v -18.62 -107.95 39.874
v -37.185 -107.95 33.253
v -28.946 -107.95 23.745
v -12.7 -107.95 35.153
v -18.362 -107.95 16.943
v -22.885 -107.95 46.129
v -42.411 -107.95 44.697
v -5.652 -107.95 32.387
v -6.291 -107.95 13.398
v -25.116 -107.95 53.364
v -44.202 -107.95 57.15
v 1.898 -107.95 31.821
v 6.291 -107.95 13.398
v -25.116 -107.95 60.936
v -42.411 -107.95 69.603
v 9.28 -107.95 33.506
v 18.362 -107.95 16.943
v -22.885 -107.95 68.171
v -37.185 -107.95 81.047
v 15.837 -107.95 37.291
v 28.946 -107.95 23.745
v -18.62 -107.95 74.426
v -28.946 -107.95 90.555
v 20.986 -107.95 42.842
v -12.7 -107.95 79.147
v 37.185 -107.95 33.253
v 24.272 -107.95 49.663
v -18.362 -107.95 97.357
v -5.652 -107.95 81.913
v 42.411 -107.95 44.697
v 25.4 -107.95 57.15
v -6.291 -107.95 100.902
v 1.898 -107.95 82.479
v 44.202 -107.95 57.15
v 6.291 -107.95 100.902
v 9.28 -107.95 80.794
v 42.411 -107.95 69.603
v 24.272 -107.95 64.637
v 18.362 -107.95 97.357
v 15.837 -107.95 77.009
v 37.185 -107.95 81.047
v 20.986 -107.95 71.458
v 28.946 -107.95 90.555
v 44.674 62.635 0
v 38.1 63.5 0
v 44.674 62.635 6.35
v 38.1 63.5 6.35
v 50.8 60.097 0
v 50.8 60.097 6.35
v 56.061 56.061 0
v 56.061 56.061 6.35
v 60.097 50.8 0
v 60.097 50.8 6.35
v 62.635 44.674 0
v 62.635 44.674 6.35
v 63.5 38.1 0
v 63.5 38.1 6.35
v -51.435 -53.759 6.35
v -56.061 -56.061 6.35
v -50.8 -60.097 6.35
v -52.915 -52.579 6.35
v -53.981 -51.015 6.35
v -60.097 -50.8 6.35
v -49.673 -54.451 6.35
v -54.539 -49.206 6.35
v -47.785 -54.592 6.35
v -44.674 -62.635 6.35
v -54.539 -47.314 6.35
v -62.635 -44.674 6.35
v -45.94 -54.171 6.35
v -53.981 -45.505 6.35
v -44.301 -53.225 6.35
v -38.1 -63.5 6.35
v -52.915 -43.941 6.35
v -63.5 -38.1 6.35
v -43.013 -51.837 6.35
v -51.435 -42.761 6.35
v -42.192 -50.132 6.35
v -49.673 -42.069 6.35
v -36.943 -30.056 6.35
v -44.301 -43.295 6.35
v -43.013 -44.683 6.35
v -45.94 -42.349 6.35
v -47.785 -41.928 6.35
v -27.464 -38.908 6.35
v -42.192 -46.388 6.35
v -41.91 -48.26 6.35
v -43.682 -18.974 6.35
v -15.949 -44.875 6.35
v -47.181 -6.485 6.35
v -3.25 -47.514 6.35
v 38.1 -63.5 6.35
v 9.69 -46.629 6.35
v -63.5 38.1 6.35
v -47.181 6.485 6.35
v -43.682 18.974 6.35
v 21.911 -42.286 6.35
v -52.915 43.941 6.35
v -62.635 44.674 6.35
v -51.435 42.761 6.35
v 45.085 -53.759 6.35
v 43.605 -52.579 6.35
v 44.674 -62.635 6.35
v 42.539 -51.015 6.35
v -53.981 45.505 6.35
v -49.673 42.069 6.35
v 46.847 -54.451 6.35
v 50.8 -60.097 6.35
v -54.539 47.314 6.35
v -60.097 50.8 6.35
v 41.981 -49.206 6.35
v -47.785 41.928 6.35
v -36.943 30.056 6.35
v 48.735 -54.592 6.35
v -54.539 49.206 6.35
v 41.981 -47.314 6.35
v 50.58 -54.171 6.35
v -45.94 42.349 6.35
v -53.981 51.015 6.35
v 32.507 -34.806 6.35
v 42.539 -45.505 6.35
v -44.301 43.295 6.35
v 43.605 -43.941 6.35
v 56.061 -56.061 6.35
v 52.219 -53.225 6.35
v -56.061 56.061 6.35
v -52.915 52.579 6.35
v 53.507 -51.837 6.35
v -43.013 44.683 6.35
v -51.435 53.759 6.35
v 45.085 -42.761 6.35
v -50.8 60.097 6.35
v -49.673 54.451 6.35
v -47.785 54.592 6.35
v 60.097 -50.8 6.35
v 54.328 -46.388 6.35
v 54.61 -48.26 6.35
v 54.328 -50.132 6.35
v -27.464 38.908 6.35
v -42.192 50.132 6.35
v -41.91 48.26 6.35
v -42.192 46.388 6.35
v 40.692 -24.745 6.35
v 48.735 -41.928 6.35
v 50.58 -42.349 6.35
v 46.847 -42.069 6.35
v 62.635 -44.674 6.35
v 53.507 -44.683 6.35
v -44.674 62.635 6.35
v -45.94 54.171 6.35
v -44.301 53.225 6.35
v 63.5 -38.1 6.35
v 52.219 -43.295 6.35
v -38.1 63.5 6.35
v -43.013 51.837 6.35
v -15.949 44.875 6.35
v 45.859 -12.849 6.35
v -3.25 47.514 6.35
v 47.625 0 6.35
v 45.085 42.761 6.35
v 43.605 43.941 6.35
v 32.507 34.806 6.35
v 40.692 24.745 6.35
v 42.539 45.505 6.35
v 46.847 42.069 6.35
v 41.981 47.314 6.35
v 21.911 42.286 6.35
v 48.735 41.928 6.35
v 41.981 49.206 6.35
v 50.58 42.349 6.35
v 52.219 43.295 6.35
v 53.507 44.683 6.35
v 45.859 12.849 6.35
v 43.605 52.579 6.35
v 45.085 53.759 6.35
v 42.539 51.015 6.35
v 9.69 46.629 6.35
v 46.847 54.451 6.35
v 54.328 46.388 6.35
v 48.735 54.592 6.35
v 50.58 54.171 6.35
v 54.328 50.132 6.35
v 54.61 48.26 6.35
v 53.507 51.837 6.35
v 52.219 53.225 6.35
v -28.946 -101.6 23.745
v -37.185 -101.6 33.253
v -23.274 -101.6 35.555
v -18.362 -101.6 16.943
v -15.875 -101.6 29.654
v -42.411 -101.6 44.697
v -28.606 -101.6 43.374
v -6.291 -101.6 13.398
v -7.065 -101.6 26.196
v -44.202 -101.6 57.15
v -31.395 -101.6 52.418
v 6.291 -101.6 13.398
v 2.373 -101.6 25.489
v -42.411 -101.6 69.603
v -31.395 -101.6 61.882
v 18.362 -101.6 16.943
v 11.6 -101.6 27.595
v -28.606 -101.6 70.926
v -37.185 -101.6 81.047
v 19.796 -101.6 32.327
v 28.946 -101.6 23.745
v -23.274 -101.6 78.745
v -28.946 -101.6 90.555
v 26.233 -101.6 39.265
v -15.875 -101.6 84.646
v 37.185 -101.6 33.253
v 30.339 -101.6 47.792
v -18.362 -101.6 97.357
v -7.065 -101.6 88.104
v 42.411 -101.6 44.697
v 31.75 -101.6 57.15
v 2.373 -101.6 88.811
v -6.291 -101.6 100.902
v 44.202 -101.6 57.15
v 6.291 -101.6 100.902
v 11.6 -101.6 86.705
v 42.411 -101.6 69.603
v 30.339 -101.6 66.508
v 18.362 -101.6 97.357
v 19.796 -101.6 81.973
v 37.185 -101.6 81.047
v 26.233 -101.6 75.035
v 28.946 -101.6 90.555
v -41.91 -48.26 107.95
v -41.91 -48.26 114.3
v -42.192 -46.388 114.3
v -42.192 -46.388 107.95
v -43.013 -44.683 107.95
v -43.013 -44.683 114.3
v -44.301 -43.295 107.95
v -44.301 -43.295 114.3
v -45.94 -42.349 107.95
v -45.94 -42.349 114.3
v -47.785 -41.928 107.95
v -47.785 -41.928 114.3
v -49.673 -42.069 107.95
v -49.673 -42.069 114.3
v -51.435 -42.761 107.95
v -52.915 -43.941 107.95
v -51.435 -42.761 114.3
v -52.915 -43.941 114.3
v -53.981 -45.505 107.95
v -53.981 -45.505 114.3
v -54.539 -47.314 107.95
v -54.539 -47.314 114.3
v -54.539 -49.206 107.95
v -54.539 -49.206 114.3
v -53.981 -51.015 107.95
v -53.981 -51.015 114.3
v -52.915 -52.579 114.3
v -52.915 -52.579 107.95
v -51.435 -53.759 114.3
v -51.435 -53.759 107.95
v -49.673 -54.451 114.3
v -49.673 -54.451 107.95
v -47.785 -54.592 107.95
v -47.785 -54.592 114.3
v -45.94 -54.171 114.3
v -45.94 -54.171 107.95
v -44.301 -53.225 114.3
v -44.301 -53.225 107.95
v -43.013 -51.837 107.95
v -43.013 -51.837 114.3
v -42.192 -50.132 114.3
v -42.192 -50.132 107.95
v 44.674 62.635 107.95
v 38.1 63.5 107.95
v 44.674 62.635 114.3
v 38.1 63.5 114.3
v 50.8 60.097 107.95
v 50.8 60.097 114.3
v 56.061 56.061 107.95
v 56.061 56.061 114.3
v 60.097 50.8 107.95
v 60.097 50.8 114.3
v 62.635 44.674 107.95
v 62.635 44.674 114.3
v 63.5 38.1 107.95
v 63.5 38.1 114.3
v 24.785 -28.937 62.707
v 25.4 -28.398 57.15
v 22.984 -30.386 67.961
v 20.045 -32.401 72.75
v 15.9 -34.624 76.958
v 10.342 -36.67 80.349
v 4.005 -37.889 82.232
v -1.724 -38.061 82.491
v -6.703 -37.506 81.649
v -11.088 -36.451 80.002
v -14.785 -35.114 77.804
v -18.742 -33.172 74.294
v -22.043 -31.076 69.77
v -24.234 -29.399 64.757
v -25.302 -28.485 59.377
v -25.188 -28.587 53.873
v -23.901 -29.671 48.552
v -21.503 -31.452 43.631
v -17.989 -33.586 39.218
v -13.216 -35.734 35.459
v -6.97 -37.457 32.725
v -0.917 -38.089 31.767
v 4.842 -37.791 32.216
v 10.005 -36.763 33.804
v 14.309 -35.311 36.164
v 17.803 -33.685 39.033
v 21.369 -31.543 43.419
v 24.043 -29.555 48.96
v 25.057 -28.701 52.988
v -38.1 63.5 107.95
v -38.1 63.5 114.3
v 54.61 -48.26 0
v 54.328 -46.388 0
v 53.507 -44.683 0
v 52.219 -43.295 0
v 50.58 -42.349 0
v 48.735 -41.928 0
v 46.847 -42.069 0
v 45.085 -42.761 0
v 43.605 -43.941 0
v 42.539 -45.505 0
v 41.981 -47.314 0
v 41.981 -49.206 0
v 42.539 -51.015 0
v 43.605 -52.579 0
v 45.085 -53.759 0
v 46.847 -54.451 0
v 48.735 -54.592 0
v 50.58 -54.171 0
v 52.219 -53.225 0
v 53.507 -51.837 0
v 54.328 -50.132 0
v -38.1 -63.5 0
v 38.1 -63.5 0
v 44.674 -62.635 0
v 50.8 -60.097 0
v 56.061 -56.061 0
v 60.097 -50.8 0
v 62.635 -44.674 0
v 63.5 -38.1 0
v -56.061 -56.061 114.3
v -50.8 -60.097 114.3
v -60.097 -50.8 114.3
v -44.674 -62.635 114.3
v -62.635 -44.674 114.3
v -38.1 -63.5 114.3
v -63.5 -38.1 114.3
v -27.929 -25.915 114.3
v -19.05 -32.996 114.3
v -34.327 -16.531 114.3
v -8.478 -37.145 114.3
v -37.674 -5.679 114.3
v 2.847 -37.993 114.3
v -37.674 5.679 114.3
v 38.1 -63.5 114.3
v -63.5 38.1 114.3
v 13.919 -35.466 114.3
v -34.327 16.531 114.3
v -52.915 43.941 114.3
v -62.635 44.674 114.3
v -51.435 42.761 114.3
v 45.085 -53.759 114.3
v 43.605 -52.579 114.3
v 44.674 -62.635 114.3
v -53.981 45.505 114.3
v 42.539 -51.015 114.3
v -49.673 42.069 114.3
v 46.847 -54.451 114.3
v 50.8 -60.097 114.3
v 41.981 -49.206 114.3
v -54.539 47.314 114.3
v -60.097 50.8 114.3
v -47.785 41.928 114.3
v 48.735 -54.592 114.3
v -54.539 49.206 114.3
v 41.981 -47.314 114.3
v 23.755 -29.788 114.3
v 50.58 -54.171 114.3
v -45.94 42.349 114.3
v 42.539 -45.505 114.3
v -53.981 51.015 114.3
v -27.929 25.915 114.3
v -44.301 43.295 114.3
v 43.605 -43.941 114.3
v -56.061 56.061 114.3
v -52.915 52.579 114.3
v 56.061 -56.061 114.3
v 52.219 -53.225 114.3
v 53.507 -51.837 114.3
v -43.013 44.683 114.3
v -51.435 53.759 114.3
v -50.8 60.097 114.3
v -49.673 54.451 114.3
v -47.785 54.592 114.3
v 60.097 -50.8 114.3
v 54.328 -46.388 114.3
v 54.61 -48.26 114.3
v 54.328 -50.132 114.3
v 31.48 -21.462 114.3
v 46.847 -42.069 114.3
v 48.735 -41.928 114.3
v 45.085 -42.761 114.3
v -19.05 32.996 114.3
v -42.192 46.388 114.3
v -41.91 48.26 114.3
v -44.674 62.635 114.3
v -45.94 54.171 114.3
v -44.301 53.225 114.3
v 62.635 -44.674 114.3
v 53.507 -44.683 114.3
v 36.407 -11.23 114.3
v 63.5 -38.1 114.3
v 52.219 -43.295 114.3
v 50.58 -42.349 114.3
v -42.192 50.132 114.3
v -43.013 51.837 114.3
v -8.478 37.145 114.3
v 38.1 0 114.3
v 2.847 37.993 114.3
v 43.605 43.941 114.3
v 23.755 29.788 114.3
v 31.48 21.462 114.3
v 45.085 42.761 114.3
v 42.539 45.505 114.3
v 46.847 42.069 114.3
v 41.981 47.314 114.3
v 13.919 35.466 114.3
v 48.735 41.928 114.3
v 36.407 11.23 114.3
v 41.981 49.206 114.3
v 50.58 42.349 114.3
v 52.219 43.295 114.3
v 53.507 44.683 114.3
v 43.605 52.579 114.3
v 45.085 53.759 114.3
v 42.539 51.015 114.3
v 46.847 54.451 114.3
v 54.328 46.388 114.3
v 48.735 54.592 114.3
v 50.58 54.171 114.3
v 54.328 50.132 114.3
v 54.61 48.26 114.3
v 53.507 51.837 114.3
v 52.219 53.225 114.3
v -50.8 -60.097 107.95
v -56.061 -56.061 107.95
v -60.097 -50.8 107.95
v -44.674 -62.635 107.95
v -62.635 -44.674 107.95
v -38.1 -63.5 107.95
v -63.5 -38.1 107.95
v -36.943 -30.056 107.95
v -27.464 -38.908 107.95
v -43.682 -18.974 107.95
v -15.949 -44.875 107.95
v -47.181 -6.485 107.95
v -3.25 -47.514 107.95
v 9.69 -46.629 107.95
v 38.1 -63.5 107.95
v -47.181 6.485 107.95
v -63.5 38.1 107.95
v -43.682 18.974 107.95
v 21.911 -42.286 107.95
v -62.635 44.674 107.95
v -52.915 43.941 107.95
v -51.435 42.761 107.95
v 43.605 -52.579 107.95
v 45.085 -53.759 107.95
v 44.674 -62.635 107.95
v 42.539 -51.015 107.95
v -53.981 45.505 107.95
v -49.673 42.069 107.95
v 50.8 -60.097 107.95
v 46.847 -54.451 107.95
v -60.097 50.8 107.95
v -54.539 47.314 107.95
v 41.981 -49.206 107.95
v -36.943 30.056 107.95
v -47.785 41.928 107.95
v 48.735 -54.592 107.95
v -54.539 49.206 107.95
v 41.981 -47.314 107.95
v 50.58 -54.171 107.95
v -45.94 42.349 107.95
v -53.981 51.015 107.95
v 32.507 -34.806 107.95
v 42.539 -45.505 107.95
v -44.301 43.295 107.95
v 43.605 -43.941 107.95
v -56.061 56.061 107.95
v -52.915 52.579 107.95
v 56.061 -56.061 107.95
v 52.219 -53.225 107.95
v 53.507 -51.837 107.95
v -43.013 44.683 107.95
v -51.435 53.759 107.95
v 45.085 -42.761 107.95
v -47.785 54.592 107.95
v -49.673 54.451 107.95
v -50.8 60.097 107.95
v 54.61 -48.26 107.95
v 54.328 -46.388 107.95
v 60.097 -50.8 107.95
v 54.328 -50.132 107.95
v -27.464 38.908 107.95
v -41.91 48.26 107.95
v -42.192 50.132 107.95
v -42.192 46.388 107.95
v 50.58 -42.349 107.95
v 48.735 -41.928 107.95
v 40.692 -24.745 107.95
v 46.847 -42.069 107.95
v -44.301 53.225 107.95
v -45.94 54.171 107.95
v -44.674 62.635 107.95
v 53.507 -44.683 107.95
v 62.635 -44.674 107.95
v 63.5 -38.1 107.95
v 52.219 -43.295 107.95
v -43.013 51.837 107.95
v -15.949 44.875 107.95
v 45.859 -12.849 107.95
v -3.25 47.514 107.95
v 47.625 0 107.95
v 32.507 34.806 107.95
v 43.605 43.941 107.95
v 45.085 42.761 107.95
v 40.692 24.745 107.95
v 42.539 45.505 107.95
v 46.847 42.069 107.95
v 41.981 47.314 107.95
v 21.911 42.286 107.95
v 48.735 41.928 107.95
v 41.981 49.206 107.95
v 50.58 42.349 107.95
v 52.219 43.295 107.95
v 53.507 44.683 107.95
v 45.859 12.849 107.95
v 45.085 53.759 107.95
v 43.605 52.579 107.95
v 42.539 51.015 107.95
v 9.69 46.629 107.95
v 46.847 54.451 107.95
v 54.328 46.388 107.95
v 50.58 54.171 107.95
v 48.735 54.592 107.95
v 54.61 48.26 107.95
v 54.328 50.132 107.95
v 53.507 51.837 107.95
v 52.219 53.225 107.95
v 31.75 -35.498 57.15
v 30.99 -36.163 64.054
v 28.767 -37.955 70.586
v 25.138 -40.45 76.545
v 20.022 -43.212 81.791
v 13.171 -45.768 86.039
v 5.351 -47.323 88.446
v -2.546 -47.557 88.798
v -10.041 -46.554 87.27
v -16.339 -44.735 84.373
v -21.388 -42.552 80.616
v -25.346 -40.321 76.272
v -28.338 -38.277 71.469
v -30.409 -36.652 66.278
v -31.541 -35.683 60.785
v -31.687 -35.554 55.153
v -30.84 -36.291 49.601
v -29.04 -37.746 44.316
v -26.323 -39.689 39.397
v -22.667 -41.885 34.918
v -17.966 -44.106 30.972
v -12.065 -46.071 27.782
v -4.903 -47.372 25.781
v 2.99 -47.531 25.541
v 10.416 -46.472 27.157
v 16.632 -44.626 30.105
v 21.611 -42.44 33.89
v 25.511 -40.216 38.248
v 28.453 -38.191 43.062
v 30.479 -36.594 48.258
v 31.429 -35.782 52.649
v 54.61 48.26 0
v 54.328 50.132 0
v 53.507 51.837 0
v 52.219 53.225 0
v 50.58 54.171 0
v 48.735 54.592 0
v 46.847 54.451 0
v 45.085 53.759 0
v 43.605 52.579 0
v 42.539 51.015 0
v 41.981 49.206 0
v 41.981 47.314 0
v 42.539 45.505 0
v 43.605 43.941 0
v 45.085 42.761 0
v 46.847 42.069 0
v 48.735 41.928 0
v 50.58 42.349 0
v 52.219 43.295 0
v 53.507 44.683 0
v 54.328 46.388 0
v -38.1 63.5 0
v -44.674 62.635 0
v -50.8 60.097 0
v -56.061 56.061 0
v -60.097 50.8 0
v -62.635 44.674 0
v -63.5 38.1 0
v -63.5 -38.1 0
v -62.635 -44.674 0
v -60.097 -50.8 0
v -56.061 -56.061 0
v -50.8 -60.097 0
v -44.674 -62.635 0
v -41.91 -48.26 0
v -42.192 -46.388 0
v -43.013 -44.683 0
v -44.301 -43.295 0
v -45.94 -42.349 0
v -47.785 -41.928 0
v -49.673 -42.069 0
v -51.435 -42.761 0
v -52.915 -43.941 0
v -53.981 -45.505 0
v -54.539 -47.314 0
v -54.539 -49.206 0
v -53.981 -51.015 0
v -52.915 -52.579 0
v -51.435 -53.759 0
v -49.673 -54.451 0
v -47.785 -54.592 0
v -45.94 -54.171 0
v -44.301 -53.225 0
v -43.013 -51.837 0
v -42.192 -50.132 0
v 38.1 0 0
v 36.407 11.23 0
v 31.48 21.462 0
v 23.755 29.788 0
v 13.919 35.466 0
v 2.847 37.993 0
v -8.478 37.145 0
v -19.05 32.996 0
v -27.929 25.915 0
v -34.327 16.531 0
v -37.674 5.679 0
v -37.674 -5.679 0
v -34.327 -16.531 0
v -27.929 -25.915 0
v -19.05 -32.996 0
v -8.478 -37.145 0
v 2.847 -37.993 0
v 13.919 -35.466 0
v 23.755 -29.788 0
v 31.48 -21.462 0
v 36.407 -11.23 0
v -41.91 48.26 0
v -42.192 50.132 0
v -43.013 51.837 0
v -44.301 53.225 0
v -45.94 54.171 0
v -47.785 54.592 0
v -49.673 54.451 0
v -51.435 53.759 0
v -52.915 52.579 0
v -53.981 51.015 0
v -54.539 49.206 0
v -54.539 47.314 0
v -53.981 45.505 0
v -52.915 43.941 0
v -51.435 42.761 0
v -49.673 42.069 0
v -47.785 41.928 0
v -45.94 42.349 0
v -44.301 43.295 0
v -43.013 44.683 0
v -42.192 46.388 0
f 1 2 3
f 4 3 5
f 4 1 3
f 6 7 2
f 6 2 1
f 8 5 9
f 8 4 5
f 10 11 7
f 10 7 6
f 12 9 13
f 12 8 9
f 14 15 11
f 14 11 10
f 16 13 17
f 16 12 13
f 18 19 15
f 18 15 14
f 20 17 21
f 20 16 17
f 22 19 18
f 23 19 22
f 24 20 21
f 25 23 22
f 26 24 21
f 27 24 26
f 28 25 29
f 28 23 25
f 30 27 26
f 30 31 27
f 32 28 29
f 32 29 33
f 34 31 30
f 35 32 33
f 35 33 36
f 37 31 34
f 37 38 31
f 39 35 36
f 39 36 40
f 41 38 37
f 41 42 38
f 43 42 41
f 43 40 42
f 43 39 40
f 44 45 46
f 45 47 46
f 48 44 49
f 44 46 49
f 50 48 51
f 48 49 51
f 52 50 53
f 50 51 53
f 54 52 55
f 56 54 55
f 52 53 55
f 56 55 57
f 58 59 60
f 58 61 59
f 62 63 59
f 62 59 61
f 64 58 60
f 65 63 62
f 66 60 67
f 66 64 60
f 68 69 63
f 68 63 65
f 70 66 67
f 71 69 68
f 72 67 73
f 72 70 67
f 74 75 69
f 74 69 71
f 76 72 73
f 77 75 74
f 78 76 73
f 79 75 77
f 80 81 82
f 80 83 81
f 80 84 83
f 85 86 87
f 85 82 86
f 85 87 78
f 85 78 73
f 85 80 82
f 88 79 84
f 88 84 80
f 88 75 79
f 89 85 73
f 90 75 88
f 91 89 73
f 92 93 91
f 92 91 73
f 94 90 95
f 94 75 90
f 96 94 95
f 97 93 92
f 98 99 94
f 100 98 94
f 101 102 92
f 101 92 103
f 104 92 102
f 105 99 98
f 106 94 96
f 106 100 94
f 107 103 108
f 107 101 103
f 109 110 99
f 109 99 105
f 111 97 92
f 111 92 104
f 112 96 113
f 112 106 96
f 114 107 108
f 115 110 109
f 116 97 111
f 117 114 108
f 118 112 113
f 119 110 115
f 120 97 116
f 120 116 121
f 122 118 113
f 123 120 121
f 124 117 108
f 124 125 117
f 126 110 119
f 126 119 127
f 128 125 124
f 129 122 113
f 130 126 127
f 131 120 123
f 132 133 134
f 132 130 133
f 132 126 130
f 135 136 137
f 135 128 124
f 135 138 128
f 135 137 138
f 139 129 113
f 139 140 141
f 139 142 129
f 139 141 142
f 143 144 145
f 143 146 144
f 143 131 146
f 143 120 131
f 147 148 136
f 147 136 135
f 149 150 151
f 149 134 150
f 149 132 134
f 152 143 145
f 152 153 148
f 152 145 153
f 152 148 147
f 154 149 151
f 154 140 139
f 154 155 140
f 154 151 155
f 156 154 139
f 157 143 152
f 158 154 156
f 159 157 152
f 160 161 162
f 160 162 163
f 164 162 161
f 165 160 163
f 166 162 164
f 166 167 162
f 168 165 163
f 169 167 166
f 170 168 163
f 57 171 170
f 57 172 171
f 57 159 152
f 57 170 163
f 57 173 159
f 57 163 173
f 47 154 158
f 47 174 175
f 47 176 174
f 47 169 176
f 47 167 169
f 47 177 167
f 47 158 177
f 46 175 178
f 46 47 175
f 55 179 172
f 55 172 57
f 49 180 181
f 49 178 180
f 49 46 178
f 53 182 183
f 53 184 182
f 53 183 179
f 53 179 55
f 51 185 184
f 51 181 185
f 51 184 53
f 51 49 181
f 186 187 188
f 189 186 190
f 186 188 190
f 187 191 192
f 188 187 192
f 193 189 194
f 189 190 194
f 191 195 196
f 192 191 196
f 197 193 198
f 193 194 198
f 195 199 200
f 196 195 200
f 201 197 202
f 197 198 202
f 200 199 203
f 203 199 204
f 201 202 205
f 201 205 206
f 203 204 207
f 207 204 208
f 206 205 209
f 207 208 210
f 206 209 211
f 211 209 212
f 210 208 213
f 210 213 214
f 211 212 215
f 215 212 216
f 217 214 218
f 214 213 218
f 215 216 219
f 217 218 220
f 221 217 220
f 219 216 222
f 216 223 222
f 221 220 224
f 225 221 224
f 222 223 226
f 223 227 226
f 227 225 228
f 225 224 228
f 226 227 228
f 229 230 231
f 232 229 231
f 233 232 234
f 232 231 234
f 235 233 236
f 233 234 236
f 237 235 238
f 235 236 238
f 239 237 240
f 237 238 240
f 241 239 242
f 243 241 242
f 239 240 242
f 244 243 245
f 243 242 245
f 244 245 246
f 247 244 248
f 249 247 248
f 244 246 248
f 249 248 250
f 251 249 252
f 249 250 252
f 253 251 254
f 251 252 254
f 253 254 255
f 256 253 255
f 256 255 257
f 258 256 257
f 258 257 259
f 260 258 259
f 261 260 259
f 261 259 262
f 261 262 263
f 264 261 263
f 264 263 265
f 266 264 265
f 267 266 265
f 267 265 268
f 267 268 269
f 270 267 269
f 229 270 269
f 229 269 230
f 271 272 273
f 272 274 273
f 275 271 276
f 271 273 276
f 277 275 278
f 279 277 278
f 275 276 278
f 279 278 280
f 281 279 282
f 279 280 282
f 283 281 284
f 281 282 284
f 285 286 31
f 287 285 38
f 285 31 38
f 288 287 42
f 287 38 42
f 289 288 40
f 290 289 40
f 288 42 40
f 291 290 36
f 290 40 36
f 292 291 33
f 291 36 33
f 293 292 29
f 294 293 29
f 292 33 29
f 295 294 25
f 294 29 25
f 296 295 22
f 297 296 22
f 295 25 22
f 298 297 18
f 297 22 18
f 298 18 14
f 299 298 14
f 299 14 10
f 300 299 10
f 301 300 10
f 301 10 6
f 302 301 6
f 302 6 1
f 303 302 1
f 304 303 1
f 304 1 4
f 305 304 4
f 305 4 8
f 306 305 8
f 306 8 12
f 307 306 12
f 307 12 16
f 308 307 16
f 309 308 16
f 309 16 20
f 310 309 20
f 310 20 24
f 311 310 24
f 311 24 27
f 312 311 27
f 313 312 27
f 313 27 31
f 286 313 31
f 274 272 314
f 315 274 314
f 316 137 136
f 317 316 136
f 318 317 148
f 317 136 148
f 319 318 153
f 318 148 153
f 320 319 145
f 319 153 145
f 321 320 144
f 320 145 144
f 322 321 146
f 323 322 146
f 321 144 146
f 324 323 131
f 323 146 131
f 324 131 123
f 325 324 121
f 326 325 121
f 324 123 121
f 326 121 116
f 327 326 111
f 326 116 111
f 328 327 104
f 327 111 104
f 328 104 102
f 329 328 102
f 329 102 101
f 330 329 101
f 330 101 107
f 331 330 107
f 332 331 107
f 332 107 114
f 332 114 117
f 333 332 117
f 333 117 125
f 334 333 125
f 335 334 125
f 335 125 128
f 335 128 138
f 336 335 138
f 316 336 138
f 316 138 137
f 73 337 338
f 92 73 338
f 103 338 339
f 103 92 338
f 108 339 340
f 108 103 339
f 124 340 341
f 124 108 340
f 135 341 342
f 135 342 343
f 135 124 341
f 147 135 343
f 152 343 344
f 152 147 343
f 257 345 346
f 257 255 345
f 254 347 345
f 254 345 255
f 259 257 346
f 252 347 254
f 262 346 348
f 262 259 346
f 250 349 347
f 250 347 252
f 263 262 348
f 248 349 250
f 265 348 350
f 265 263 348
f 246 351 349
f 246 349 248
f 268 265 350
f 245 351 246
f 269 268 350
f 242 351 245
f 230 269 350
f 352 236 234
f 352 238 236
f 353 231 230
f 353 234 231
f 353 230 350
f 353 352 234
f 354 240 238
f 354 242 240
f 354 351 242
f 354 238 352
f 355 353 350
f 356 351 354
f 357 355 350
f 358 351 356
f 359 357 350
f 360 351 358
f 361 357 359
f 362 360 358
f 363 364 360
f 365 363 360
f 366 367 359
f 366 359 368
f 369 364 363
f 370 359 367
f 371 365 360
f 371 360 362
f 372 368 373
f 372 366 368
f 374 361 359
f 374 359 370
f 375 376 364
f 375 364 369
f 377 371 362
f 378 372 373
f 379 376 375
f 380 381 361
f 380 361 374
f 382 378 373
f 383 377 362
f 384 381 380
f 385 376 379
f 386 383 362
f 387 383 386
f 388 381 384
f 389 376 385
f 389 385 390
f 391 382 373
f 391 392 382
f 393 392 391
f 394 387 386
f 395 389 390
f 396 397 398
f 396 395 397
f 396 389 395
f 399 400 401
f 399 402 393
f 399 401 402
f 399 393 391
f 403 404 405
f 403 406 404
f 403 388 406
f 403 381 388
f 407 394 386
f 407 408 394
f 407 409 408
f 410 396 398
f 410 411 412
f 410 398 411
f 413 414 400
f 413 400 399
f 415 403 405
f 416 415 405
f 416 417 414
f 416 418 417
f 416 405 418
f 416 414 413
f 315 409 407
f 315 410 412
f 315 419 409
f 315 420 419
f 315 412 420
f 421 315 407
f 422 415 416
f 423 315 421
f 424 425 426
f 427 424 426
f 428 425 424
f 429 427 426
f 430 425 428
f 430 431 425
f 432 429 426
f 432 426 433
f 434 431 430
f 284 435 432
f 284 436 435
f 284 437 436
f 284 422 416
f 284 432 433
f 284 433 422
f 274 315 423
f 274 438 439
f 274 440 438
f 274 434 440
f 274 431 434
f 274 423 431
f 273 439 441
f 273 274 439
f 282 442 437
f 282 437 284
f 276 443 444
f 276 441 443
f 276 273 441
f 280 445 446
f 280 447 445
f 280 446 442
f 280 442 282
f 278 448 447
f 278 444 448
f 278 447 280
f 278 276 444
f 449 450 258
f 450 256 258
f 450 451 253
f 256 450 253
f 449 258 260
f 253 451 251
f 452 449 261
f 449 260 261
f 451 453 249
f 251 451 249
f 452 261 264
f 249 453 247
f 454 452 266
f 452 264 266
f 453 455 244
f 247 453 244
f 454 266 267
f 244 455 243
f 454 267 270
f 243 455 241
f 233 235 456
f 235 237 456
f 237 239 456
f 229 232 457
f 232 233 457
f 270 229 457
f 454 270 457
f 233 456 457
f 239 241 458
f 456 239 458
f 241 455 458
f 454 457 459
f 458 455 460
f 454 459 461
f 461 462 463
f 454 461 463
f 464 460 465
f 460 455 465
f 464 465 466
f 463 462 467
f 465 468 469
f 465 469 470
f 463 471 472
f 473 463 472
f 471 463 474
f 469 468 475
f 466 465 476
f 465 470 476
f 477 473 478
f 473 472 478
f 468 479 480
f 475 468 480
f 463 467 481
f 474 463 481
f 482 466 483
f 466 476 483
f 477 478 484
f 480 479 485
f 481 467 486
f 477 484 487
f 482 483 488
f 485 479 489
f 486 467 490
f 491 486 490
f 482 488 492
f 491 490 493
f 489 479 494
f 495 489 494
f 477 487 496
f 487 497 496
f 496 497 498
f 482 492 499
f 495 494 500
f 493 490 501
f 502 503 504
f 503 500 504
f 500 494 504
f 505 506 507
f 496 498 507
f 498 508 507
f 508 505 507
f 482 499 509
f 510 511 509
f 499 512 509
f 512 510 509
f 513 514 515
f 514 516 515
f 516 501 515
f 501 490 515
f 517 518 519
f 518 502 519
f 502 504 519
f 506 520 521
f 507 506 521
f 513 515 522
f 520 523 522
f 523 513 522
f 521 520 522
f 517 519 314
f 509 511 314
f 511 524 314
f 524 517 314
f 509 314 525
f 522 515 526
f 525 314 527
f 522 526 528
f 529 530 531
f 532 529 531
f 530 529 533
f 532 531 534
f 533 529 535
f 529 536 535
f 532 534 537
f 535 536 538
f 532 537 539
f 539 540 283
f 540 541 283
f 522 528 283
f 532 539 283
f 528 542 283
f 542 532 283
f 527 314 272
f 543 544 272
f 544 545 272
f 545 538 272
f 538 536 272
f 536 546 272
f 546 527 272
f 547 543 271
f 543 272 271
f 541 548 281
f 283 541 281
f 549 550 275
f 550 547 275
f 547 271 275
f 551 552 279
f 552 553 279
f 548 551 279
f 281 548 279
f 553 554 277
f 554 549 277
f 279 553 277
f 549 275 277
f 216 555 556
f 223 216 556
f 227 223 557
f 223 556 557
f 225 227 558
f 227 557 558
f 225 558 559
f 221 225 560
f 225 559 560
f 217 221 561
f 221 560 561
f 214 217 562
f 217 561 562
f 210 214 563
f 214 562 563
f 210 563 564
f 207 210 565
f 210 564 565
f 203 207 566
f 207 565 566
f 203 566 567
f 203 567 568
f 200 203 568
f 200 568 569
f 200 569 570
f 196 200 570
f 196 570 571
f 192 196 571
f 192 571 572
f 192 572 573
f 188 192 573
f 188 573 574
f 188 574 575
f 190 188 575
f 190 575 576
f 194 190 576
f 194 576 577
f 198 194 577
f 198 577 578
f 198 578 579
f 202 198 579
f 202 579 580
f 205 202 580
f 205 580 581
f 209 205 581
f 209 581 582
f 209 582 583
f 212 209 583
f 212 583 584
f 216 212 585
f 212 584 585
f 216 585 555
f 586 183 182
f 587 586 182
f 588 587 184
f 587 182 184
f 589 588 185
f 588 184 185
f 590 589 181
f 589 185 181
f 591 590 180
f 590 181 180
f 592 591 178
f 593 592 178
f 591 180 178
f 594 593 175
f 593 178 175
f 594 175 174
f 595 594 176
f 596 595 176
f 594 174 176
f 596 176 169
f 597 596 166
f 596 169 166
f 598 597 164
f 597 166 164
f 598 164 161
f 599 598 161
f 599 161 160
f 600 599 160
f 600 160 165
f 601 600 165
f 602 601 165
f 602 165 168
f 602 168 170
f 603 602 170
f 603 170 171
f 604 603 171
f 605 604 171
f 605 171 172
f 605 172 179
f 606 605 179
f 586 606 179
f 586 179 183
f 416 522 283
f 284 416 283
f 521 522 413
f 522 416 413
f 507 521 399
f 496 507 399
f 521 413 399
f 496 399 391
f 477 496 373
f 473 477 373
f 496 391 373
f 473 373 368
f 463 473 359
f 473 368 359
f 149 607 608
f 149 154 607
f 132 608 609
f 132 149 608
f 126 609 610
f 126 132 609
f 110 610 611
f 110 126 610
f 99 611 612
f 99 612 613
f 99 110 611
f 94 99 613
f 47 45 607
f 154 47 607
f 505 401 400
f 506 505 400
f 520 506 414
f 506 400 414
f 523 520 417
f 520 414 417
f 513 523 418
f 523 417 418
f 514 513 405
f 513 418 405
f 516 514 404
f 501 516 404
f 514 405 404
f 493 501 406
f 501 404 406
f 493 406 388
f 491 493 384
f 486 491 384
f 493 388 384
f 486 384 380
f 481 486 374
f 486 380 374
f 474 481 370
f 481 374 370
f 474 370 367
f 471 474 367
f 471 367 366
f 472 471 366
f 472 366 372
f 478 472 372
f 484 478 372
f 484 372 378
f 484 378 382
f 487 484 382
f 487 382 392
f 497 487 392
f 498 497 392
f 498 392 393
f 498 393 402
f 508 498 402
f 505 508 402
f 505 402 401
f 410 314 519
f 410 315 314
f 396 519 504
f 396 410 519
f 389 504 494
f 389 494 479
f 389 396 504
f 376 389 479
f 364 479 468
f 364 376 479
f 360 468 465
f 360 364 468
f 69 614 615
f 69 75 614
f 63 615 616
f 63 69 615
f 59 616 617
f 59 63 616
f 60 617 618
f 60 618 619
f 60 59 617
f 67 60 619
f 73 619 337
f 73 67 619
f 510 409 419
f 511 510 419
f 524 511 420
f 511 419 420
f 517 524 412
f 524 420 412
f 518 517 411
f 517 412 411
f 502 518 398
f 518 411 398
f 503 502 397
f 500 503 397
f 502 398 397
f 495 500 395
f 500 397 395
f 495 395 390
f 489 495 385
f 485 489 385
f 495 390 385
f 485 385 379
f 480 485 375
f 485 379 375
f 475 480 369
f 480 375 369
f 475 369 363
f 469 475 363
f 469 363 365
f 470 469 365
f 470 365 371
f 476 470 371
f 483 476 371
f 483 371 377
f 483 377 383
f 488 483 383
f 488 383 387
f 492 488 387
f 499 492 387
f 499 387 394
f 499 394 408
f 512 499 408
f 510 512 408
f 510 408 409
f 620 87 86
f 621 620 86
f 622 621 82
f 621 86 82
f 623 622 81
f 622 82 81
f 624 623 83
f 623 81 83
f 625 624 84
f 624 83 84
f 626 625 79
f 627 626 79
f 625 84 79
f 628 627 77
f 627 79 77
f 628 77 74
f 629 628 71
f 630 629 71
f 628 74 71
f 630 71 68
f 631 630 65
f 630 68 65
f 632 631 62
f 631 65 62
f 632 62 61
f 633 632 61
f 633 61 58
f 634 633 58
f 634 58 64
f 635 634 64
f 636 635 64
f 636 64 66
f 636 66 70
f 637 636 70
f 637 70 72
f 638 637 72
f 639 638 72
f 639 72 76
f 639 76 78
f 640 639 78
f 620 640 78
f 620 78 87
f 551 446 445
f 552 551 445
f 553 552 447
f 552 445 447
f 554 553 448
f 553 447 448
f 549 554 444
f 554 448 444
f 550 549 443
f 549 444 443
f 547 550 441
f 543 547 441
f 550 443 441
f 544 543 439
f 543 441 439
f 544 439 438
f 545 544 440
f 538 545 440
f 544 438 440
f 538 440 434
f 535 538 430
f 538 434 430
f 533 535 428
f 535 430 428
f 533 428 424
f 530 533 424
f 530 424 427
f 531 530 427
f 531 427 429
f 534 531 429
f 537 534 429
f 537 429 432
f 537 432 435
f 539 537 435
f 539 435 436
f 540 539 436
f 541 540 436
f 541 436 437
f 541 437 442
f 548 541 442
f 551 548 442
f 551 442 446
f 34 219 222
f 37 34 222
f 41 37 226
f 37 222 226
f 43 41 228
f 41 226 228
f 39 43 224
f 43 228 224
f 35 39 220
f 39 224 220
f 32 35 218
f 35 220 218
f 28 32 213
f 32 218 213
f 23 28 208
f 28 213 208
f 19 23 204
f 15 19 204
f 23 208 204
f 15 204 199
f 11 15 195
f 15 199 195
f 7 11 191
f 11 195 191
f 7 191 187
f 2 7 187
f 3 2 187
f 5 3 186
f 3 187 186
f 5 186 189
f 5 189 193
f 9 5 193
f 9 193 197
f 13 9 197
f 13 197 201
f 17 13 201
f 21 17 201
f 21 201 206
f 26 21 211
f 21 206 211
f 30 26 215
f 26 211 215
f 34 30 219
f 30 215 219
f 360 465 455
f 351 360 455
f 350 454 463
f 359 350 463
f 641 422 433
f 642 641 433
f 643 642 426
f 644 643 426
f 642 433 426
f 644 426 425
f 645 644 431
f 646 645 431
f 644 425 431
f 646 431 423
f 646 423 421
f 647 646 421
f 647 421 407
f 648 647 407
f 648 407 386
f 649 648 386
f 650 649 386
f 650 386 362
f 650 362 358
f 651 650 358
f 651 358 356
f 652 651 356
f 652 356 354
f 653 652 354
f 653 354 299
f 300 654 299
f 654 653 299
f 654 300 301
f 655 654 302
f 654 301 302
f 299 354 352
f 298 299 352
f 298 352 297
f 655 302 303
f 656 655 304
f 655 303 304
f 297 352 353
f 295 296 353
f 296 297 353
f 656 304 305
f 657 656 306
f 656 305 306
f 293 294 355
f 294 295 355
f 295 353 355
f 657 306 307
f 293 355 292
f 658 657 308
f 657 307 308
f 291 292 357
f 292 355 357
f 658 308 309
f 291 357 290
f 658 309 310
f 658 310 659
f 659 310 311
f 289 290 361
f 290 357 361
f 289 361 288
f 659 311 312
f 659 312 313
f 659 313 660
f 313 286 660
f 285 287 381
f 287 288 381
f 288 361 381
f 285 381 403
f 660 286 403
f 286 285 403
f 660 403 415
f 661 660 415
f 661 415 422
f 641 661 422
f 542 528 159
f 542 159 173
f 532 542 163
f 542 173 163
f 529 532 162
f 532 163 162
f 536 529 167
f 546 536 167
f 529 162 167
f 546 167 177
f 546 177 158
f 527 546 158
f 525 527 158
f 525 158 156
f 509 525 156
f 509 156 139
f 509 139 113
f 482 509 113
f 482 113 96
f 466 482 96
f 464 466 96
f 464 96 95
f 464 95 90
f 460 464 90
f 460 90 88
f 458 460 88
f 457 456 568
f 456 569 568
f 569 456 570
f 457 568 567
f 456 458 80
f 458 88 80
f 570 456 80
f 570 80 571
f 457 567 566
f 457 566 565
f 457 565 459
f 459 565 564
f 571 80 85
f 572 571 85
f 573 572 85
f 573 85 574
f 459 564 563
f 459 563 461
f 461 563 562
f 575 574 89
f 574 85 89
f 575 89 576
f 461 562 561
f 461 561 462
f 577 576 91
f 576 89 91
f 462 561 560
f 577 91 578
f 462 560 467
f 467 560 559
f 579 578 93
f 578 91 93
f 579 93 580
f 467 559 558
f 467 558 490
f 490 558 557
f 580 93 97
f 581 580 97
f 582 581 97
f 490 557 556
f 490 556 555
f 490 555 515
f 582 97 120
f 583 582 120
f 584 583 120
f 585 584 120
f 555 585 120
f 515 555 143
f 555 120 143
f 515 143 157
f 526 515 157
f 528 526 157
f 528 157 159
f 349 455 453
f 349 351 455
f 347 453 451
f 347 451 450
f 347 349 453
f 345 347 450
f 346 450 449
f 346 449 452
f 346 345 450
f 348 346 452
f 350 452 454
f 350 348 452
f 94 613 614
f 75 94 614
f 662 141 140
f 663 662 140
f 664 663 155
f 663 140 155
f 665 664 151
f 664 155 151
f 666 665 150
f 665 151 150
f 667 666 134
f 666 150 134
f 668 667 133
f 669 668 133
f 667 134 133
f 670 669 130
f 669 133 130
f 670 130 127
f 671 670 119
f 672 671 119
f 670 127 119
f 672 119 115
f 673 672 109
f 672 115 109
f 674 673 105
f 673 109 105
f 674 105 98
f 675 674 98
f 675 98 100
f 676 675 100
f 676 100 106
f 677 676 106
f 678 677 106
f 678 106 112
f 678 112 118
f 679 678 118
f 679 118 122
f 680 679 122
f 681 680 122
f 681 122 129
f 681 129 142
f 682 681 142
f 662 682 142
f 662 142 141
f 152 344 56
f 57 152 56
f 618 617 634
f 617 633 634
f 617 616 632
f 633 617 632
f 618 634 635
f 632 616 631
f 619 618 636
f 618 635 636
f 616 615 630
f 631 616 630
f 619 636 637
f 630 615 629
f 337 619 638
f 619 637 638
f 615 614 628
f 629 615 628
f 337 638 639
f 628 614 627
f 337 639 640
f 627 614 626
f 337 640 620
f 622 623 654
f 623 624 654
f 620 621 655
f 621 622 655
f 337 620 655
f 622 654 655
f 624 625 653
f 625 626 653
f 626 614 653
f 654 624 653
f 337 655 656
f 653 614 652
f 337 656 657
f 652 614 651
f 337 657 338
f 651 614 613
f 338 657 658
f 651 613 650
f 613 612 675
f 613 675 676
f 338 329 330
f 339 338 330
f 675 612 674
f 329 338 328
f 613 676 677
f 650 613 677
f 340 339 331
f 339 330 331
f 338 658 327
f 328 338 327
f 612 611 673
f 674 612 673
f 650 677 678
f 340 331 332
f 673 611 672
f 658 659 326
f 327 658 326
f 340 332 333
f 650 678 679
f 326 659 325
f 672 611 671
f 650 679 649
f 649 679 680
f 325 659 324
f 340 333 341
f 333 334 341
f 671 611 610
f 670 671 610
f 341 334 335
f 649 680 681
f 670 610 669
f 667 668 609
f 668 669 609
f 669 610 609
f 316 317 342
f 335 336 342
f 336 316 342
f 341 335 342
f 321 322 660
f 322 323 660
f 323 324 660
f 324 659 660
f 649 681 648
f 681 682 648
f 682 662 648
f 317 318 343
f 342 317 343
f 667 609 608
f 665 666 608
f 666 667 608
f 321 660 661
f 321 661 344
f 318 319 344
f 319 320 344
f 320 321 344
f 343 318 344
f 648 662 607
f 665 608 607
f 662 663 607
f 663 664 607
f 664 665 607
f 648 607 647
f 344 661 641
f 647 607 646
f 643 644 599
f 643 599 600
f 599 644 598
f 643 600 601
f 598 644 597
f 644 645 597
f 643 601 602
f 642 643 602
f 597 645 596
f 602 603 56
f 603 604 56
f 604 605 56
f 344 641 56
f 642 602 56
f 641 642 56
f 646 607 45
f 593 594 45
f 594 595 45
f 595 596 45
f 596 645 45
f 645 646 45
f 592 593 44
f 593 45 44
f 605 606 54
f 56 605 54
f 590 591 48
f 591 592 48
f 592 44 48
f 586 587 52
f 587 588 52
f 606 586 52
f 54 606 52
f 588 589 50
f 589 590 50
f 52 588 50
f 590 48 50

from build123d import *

# Parameters (mm, degrees)
F1_DEPTH  = 6.35
F2_R      = 25.4
F3_R      = 47.625
F4_DEPTH  = 101.6
F6_DEPTH  = 6.35
F7_R      = 25.4
F8_R      = 31.75
F9_DEPTH  = 101.6
F10_R     = 44.20165183
F10_R_2   = 31.75
F11_DEPTH = 6.35
F12_R     = 38.1
F13_DEPTH = 114.3
F14_R     = 25.4
F15_DEPTH = 88.9
F16_R     = 6.35
F17_DEPTH = 114.3


with BuildPart() as f1:
    # F0 (on Top) → F1 (new body)
    with BuildSketch(Plane.XY):
        Polygon((63.5, 63.5), (0, 63.5), (-63.5, 63.5), (-63.5, 0), (-63.5, -63.5), (0, -63.5), (63.5, -63.5), (63.5, 0), align=None)
    extrude(amount=F1_DEPTH)

    # F2
    f2_edges = [f1.edges().sort_by_distance(p)[0] for p in [
        (63.5, -63.5, 3.175),
        (63.5, 63.5, 3.175),
        (-63.5, -63.5, 3.175),
        (-63.5, 63.5, 3.175),
    ]]
    fillet(f2_edges, radius=F2_R)

    # F3 (on face) → F4 (join)
    with BuildSketch(Plane.XY.offset(6.35)):
        Circle(F3_R)
    extrude(amount=F4_DEPTH)

    # F5 (on face) → F6 (join)
    with BuildSketch(Plane.XY.offset(107.95)):
        Polygon((63.5, 63.5), (0, 63.5), (-63.5, 63.5), (-63.5, 0), (-63.5, -63.5), (0, -63.5), (63.5, -63.5), (63.5, 0), align=None)
    extrude(amount=F6_DEPTH)

    # F7
    f7_edges = [f1.edges().sort_by_distance(p)[0] for p in [
        (63.5, -63.5, 111.125),
        (-63.5, -63.5, 111.125),
        (63.5, 63.5, 111.125),
        (-63.5, 63.5, 111.125),
    ]]
    fillet(f7_edges, radius=F7_R)

    # F8 (on Front) → F9 (join)
    with BuildSketch(Plane.XZ):
        with Locations((0, 57.15)):
            Circle(F8_R)
    extrude(amount=F9_DEPTH)

    # F10 (on face) → F11 (join)
    with BuildSketch(Plane.XZ.offset(101.6)):
        with Locations((0, 57.15)):
            Circle(F10_R)
        with Locations((0, 57.15)):
            Circle(F10_R_2, mode=Mode.SUBTRACT)
        with Locations((0, 57.15)):
            Circle(F10_R_2)
    extrude(amount=F11_DEPTH)

    # F12 (on face) → F13 (cut)
    with BuildSketch(Plane.XY.offset(114.3)):
        Circle(F12_R)
    extrude(amount=-F13_DEPTH, mode=Mode.SUBTRACT)

    # F14 (on face) → F15 (cut)
    with BuildSketch(Plane.XZ.offset(107.95)):
        with Locations((0, 57.15)):
            Circle(F14_R)
    extrude(amount=-F15_DEPTH, mode=Mode.SUBTRACT)

    # F16 (on face) → F17 (cut)
    with BuildSketch(Plane.XY.offset(114.3)):
        with Locations((-48.26, 48.26)):
            Circle(F16_R)
        with Locations((48.26, 48.26)):
            Circle(F16_R)
        with Locations((48.26, -48.26)):
            Circle(F16_R)
        with Locations((-48.26, -48.26)):
            Circle(F16_R)
    extrude(amount=-F17_DEPTH, mode=Mode.SUBTRACT)


solid = f1.part
